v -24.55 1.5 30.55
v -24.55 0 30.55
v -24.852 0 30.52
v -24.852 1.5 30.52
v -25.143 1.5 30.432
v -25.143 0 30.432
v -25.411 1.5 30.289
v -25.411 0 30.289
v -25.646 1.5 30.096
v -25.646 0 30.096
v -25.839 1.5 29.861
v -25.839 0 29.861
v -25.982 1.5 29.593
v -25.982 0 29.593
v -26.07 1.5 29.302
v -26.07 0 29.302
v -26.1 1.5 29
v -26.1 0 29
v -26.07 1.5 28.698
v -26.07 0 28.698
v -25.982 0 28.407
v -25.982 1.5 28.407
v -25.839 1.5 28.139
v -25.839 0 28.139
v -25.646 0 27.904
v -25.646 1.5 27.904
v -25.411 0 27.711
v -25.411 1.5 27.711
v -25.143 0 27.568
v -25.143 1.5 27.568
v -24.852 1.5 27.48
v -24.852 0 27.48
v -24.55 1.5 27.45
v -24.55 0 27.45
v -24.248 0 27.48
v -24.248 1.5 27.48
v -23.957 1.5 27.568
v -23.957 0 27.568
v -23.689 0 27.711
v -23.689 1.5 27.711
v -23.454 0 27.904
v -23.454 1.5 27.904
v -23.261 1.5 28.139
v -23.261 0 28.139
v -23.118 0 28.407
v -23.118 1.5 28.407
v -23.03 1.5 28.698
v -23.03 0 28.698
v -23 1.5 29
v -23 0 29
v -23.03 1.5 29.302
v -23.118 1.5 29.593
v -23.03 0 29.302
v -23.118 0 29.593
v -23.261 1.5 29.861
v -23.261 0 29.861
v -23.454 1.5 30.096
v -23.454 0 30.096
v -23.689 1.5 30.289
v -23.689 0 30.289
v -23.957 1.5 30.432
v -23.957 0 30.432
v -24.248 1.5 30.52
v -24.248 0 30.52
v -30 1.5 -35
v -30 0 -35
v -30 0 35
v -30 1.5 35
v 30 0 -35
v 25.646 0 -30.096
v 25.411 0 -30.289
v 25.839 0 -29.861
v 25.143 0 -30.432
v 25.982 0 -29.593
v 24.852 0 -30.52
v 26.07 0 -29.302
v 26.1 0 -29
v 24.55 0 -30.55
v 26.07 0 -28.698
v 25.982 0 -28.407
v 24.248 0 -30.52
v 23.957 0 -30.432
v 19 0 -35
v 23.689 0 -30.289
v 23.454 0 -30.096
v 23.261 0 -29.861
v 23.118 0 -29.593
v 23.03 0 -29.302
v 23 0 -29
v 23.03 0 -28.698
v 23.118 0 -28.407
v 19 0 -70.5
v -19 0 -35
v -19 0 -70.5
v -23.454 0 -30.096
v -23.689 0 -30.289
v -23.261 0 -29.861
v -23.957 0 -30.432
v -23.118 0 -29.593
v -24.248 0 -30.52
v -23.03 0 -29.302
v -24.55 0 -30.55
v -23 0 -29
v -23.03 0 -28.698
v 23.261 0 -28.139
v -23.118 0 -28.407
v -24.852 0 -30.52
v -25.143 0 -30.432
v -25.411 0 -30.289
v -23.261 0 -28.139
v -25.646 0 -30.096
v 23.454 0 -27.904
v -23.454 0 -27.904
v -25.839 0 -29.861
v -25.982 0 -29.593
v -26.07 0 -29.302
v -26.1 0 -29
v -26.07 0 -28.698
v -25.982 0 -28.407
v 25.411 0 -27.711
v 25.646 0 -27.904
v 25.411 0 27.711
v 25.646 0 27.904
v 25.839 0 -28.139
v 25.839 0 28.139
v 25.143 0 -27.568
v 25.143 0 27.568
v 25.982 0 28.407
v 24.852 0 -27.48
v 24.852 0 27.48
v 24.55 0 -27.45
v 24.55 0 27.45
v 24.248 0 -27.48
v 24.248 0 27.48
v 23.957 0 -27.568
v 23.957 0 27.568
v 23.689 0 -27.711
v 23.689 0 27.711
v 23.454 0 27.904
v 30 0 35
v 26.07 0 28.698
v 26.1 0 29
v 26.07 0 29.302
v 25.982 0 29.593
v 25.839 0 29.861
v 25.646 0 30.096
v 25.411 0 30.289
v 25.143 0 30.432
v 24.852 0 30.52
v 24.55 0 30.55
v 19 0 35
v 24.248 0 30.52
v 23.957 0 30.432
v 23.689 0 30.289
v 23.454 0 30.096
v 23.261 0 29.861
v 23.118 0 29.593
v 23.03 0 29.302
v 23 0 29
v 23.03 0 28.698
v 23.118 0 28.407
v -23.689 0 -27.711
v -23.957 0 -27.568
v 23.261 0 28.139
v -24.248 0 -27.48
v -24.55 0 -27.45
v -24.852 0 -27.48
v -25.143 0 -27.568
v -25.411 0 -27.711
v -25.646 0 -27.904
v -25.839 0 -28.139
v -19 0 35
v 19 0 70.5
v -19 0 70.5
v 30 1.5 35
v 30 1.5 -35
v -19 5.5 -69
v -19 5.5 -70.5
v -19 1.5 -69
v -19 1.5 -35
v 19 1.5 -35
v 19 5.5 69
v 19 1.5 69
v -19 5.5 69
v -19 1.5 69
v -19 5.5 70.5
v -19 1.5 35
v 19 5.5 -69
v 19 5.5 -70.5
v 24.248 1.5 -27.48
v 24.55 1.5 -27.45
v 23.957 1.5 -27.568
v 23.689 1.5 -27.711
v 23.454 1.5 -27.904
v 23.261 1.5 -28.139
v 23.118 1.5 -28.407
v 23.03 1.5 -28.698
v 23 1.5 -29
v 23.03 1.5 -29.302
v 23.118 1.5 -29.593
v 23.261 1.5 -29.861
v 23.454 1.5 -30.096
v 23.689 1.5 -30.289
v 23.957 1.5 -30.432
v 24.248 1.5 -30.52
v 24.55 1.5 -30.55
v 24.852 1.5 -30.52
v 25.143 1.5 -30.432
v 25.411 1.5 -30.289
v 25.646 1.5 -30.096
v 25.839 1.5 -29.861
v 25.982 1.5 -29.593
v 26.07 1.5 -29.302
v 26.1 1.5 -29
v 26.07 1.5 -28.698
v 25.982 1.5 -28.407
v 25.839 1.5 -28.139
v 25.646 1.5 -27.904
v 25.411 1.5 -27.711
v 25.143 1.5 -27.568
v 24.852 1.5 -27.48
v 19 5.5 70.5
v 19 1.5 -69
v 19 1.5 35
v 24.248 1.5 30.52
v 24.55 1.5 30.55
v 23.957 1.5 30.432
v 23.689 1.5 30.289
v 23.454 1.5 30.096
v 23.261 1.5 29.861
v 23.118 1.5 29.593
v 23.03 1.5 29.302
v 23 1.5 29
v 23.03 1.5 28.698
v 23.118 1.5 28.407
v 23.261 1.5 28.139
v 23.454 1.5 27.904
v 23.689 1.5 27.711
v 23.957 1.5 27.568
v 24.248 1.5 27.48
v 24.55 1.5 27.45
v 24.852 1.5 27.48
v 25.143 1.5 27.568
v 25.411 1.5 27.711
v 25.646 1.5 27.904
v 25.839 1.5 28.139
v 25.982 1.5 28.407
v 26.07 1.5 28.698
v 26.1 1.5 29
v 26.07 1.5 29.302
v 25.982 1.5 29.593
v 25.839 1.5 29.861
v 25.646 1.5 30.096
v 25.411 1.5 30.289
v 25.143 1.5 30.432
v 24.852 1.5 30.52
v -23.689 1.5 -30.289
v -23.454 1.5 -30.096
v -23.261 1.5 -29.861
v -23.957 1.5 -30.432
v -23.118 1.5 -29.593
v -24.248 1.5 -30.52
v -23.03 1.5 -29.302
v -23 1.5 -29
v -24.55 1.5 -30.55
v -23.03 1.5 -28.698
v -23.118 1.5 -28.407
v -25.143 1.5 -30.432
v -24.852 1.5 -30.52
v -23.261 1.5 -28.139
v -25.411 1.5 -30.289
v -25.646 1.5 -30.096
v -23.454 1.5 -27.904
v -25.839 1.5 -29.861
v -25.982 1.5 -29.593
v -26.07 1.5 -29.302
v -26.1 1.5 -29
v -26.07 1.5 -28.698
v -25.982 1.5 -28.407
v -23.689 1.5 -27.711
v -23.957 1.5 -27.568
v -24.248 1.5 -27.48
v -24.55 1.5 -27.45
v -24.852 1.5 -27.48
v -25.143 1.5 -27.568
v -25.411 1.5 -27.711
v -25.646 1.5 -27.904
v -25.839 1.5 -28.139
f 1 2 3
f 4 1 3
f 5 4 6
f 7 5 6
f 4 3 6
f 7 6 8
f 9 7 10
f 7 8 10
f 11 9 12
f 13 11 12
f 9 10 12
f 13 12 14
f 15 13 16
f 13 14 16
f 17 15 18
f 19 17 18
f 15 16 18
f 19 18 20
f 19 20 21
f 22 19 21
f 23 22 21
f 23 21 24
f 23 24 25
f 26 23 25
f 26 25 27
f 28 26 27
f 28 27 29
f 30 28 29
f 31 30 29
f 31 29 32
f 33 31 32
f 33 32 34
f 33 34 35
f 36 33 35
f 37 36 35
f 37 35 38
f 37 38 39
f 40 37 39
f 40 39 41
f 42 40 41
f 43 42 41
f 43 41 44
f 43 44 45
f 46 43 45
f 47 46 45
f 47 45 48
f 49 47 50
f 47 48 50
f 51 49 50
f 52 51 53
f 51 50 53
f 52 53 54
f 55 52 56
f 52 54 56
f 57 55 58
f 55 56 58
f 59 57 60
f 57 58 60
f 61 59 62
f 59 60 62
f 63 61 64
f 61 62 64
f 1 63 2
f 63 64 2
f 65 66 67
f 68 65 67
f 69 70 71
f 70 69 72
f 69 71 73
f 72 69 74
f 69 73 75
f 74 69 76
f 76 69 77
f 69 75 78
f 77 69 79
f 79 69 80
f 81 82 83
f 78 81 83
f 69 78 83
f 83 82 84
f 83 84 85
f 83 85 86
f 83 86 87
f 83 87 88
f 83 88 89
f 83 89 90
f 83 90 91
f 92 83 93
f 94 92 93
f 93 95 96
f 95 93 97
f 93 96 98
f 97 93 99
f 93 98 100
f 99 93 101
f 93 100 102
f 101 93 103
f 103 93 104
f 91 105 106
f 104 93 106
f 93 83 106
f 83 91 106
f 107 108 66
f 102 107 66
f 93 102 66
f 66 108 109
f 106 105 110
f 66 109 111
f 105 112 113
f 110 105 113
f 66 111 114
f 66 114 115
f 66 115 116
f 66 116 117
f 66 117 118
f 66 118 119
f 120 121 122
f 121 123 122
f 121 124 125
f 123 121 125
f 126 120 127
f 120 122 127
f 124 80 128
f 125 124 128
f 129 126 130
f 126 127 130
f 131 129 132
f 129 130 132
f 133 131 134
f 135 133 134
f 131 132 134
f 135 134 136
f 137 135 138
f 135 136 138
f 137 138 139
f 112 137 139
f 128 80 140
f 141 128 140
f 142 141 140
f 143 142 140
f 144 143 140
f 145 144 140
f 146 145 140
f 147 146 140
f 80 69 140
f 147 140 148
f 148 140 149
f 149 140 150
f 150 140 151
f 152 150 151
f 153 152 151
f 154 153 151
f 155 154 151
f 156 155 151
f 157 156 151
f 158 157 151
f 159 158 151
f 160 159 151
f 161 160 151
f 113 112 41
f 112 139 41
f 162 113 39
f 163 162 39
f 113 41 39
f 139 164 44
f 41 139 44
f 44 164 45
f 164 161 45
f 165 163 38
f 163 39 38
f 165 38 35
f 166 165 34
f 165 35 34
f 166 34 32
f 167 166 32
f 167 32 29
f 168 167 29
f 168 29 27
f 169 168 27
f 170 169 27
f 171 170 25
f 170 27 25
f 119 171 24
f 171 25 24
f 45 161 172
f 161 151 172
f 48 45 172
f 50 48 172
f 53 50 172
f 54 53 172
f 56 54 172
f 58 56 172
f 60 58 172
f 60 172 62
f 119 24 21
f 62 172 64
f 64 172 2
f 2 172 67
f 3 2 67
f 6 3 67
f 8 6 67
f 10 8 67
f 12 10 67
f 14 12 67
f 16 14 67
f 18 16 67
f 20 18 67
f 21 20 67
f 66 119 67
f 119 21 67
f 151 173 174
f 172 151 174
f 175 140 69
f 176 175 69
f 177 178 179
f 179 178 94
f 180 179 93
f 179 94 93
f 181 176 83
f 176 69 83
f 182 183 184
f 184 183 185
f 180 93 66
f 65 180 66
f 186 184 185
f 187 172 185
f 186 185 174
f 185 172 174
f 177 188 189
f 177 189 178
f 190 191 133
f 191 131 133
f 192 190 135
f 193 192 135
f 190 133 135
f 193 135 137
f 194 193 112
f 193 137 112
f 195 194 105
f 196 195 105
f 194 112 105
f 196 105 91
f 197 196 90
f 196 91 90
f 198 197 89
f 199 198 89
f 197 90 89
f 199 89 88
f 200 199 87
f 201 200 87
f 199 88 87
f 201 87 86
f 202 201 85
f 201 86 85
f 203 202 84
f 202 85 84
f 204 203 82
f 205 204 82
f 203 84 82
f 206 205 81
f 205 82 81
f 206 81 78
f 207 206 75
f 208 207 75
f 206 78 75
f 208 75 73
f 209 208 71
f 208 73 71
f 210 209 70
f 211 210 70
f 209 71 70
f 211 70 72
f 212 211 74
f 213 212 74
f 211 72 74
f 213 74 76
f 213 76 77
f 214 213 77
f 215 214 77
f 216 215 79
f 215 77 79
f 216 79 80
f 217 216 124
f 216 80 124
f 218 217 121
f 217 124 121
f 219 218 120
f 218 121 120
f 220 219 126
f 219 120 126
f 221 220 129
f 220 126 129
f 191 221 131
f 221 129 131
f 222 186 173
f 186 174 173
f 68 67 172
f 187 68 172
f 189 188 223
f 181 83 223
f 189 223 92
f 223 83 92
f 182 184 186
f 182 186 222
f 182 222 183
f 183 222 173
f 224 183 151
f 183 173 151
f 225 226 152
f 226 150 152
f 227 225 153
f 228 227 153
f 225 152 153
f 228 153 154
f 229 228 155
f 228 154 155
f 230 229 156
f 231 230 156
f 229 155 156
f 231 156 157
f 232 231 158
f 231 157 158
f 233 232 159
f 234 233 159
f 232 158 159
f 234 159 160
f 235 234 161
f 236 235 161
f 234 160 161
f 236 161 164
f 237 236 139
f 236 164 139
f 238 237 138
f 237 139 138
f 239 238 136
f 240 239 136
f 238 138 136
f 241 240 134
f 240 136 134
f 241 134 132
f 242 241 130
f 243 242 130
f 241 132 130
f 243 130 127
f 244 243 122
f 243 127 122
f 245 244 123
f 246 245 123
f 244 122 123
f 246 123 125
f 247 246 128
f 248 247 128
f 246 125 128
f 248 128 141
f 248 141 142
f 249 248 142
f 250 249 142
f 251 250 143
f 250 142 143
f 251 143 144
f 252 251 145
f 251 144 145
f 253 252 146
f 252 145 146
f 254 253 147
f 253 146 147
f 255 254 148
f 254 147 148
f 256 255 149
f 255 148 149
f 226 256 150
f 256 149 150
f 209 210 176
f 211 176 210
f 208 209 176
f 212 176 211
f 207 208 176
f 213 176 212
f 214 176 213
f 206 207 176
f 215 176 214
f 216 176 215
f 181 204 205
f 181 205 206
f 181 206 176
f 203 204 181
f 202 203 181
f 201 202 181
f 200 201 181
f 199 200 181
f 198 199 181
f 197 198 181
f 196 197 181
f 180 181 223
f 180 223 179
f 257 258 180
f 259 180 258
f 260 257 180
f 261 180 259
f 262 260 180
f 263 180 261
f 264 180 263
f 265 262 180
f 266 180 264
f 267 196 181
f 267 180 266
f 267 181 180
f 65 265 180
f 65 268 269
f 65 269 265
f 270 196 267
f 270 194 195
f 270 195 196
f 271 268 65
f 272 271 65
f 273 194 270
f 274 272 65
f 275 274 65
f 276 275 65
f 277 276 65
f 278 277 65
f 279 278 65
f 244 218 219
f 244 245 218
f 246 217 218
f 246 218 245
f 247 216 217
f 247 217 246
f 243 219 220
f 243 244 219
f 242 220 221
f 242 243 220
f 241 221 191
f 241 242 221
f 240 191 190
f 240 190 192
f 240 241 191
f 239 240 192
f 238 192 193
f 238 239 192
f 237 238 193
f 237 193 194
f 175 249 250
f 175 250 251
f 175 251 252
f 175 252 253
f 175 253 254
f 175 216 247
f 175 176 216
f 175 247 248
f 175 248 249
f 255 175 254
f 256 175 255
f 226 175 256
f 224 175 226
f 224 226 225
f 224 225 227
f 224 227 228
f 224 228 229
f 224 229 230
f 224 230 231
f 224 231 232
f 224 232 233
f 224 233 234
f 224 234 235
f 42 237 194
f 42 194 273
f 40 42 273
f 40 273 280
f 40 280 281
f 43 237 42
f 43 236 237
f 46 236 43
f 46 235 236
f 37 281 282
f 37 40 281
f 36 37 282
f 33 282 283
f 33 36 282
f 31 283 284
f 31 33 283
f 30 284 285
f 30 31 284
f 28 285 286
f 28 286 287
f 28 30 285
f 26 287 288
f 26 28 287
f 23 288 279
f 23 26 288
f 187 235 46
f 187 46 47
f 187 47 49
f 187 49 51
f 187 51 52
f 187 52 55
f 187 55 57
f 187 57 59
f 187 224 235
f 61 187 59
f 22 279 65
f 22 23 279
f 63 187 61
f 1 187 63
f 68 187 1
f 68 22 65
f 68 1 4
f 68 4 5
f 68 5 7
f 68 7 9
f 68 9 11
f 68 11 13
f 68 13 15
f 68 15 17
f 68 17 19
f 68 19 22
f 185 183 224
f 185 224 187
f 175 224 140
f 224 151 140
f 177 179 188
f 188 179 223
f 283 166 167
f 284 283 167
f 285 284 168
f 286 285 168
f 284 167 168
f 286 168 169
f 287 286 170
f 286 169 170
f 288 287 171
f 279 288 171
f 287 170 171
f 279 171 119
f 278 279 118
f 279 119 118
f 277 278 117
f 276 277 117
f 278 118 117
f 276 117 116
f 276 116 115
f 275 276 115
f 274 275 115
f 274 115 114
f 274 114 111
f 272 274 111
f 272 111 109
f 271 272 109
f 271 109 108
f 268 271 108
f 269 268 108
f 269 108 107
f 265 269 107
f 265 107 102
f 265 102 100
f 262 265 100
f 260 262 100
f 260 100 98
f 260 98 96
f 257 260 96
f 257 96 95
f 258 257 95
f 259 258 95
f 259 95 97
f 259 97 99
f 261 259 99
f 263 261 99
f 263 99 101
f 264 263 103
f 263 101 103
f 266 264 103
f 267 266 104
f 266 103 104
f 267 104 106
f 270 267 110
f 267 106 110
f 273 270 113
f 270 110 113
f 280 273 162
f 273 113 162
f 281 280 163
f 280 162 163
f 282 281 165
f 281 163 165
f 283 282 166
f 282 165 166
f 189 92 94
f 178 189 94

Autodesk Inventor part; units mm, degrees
ref_plane "YZ Plane" through (0, 0, 0) normal (1, 0, 0) x (0, 1, 0)
ref_plane "XZ Plane" through (0, 0, 0) normal (0, 1, 0) x (-1, 0, 0)
ref_plane "XY Plane" through (0, 0, 0) normal (0, 0, 1) x (1, 0, 0)
sketch "Boceto1" plane through (0, 0, 0) normal (0, 1, 0) x (-1, 0, 0)
  line L0 (-19, -70.5) -> (19, -70.5)
  line L1 (19, -70.5) -> (19, 70.5)
  line L2 (19, 70.5) -> (-19, 70.5)
  line L3 (-19, 70.5) -> (-19, -70.5)
  line L4 (-19, -70.5) -> (19, 70.5) construction
  line L5 (19, -70.5) -> (-19, 70.5) construction
  line L6 (-30, -35) -> (30, -35)
  line L7 (30, -35) -> (30, 35)
  line L8 (30, 35) -> (-30, 35)
  line L9 (-30, 35) -> (-30, -35)
  line L10 (-30, -35) -> (30, 35) construction
  line L11 (30, -35) -> (-30, 35) construction
  point P0 (0, 0)
  point P1 (-19, 35)
  point P2 (-19, -35)
  point P3 (19, -35)
  point P4 (19, 35)
  dimension "d0" = 141
  dimension "d1" = 38
  dimension "d2" = 70
  dimension "d3" = 60
extrude "Extrusión1" add sketch "Boceto1" along normal blind 1.5
sketch "Boceto2" plane through (0, 1.5, 0) normal (0, 1, 0) x (1, 0, 0)
  line L0 (24.55, 29) -> (-24.55, 29)
  line L1 (-24.55, 29) -> (-24.55, -29)
  line L2 (-24.55, -29) -> (24.55, -29)
  line L3 (24.55, -29) -> (24.55, 29)
  line L4 (24.55, 29) -> (-24.55, -29) construction
  line L5 (-24.55, 29) -> (24.55, -29) construction
  point P0 (0, 0)
  dimension "d6" = 49.1
  dimension "d7" = 58
hole "Agujero1" at (-24.55, 1.5, 29) at (-24.55, 1.5, -29) at (24.55, 1.5, -29) at (24.55, 1.5, 29) direction (0, -1, 0) diameter 3.1 end through all clearance for "Tornillo para maquinaria de cabeza plana" size "M2.5" standard "Perfil M métrico ANSI"
sketch "Boceto3" plane through (0, 1.5, 0) normal (0, 1, 0) x (1, 0, 0)
  line L0 (-19, -35) -> (-19, -70.5) projected
  line L1 (19, -70.5) -> (19, -35) projected
  line L2 (-19, -70.5) -> (19, -70.5)
  line L3 (19, -70.5) -> (19, -69)
  line L4 (19, -69) -> (-19, -69)
  line L5 (-19, -69) -> (-19, -70.5)
  point P0 (0, 0)
  point P1 (19, -70.5)
  dimension "d15" = 1.5
extrude "Extrusión2" add sketch "Boceto3" along normal blind 4
mirror "Simetría1" about plane through (0, 0, 0) normal (0, 0, 1) of "Extrusión2"
properties part number "Soporte_bateria_p1_3DPrint"
